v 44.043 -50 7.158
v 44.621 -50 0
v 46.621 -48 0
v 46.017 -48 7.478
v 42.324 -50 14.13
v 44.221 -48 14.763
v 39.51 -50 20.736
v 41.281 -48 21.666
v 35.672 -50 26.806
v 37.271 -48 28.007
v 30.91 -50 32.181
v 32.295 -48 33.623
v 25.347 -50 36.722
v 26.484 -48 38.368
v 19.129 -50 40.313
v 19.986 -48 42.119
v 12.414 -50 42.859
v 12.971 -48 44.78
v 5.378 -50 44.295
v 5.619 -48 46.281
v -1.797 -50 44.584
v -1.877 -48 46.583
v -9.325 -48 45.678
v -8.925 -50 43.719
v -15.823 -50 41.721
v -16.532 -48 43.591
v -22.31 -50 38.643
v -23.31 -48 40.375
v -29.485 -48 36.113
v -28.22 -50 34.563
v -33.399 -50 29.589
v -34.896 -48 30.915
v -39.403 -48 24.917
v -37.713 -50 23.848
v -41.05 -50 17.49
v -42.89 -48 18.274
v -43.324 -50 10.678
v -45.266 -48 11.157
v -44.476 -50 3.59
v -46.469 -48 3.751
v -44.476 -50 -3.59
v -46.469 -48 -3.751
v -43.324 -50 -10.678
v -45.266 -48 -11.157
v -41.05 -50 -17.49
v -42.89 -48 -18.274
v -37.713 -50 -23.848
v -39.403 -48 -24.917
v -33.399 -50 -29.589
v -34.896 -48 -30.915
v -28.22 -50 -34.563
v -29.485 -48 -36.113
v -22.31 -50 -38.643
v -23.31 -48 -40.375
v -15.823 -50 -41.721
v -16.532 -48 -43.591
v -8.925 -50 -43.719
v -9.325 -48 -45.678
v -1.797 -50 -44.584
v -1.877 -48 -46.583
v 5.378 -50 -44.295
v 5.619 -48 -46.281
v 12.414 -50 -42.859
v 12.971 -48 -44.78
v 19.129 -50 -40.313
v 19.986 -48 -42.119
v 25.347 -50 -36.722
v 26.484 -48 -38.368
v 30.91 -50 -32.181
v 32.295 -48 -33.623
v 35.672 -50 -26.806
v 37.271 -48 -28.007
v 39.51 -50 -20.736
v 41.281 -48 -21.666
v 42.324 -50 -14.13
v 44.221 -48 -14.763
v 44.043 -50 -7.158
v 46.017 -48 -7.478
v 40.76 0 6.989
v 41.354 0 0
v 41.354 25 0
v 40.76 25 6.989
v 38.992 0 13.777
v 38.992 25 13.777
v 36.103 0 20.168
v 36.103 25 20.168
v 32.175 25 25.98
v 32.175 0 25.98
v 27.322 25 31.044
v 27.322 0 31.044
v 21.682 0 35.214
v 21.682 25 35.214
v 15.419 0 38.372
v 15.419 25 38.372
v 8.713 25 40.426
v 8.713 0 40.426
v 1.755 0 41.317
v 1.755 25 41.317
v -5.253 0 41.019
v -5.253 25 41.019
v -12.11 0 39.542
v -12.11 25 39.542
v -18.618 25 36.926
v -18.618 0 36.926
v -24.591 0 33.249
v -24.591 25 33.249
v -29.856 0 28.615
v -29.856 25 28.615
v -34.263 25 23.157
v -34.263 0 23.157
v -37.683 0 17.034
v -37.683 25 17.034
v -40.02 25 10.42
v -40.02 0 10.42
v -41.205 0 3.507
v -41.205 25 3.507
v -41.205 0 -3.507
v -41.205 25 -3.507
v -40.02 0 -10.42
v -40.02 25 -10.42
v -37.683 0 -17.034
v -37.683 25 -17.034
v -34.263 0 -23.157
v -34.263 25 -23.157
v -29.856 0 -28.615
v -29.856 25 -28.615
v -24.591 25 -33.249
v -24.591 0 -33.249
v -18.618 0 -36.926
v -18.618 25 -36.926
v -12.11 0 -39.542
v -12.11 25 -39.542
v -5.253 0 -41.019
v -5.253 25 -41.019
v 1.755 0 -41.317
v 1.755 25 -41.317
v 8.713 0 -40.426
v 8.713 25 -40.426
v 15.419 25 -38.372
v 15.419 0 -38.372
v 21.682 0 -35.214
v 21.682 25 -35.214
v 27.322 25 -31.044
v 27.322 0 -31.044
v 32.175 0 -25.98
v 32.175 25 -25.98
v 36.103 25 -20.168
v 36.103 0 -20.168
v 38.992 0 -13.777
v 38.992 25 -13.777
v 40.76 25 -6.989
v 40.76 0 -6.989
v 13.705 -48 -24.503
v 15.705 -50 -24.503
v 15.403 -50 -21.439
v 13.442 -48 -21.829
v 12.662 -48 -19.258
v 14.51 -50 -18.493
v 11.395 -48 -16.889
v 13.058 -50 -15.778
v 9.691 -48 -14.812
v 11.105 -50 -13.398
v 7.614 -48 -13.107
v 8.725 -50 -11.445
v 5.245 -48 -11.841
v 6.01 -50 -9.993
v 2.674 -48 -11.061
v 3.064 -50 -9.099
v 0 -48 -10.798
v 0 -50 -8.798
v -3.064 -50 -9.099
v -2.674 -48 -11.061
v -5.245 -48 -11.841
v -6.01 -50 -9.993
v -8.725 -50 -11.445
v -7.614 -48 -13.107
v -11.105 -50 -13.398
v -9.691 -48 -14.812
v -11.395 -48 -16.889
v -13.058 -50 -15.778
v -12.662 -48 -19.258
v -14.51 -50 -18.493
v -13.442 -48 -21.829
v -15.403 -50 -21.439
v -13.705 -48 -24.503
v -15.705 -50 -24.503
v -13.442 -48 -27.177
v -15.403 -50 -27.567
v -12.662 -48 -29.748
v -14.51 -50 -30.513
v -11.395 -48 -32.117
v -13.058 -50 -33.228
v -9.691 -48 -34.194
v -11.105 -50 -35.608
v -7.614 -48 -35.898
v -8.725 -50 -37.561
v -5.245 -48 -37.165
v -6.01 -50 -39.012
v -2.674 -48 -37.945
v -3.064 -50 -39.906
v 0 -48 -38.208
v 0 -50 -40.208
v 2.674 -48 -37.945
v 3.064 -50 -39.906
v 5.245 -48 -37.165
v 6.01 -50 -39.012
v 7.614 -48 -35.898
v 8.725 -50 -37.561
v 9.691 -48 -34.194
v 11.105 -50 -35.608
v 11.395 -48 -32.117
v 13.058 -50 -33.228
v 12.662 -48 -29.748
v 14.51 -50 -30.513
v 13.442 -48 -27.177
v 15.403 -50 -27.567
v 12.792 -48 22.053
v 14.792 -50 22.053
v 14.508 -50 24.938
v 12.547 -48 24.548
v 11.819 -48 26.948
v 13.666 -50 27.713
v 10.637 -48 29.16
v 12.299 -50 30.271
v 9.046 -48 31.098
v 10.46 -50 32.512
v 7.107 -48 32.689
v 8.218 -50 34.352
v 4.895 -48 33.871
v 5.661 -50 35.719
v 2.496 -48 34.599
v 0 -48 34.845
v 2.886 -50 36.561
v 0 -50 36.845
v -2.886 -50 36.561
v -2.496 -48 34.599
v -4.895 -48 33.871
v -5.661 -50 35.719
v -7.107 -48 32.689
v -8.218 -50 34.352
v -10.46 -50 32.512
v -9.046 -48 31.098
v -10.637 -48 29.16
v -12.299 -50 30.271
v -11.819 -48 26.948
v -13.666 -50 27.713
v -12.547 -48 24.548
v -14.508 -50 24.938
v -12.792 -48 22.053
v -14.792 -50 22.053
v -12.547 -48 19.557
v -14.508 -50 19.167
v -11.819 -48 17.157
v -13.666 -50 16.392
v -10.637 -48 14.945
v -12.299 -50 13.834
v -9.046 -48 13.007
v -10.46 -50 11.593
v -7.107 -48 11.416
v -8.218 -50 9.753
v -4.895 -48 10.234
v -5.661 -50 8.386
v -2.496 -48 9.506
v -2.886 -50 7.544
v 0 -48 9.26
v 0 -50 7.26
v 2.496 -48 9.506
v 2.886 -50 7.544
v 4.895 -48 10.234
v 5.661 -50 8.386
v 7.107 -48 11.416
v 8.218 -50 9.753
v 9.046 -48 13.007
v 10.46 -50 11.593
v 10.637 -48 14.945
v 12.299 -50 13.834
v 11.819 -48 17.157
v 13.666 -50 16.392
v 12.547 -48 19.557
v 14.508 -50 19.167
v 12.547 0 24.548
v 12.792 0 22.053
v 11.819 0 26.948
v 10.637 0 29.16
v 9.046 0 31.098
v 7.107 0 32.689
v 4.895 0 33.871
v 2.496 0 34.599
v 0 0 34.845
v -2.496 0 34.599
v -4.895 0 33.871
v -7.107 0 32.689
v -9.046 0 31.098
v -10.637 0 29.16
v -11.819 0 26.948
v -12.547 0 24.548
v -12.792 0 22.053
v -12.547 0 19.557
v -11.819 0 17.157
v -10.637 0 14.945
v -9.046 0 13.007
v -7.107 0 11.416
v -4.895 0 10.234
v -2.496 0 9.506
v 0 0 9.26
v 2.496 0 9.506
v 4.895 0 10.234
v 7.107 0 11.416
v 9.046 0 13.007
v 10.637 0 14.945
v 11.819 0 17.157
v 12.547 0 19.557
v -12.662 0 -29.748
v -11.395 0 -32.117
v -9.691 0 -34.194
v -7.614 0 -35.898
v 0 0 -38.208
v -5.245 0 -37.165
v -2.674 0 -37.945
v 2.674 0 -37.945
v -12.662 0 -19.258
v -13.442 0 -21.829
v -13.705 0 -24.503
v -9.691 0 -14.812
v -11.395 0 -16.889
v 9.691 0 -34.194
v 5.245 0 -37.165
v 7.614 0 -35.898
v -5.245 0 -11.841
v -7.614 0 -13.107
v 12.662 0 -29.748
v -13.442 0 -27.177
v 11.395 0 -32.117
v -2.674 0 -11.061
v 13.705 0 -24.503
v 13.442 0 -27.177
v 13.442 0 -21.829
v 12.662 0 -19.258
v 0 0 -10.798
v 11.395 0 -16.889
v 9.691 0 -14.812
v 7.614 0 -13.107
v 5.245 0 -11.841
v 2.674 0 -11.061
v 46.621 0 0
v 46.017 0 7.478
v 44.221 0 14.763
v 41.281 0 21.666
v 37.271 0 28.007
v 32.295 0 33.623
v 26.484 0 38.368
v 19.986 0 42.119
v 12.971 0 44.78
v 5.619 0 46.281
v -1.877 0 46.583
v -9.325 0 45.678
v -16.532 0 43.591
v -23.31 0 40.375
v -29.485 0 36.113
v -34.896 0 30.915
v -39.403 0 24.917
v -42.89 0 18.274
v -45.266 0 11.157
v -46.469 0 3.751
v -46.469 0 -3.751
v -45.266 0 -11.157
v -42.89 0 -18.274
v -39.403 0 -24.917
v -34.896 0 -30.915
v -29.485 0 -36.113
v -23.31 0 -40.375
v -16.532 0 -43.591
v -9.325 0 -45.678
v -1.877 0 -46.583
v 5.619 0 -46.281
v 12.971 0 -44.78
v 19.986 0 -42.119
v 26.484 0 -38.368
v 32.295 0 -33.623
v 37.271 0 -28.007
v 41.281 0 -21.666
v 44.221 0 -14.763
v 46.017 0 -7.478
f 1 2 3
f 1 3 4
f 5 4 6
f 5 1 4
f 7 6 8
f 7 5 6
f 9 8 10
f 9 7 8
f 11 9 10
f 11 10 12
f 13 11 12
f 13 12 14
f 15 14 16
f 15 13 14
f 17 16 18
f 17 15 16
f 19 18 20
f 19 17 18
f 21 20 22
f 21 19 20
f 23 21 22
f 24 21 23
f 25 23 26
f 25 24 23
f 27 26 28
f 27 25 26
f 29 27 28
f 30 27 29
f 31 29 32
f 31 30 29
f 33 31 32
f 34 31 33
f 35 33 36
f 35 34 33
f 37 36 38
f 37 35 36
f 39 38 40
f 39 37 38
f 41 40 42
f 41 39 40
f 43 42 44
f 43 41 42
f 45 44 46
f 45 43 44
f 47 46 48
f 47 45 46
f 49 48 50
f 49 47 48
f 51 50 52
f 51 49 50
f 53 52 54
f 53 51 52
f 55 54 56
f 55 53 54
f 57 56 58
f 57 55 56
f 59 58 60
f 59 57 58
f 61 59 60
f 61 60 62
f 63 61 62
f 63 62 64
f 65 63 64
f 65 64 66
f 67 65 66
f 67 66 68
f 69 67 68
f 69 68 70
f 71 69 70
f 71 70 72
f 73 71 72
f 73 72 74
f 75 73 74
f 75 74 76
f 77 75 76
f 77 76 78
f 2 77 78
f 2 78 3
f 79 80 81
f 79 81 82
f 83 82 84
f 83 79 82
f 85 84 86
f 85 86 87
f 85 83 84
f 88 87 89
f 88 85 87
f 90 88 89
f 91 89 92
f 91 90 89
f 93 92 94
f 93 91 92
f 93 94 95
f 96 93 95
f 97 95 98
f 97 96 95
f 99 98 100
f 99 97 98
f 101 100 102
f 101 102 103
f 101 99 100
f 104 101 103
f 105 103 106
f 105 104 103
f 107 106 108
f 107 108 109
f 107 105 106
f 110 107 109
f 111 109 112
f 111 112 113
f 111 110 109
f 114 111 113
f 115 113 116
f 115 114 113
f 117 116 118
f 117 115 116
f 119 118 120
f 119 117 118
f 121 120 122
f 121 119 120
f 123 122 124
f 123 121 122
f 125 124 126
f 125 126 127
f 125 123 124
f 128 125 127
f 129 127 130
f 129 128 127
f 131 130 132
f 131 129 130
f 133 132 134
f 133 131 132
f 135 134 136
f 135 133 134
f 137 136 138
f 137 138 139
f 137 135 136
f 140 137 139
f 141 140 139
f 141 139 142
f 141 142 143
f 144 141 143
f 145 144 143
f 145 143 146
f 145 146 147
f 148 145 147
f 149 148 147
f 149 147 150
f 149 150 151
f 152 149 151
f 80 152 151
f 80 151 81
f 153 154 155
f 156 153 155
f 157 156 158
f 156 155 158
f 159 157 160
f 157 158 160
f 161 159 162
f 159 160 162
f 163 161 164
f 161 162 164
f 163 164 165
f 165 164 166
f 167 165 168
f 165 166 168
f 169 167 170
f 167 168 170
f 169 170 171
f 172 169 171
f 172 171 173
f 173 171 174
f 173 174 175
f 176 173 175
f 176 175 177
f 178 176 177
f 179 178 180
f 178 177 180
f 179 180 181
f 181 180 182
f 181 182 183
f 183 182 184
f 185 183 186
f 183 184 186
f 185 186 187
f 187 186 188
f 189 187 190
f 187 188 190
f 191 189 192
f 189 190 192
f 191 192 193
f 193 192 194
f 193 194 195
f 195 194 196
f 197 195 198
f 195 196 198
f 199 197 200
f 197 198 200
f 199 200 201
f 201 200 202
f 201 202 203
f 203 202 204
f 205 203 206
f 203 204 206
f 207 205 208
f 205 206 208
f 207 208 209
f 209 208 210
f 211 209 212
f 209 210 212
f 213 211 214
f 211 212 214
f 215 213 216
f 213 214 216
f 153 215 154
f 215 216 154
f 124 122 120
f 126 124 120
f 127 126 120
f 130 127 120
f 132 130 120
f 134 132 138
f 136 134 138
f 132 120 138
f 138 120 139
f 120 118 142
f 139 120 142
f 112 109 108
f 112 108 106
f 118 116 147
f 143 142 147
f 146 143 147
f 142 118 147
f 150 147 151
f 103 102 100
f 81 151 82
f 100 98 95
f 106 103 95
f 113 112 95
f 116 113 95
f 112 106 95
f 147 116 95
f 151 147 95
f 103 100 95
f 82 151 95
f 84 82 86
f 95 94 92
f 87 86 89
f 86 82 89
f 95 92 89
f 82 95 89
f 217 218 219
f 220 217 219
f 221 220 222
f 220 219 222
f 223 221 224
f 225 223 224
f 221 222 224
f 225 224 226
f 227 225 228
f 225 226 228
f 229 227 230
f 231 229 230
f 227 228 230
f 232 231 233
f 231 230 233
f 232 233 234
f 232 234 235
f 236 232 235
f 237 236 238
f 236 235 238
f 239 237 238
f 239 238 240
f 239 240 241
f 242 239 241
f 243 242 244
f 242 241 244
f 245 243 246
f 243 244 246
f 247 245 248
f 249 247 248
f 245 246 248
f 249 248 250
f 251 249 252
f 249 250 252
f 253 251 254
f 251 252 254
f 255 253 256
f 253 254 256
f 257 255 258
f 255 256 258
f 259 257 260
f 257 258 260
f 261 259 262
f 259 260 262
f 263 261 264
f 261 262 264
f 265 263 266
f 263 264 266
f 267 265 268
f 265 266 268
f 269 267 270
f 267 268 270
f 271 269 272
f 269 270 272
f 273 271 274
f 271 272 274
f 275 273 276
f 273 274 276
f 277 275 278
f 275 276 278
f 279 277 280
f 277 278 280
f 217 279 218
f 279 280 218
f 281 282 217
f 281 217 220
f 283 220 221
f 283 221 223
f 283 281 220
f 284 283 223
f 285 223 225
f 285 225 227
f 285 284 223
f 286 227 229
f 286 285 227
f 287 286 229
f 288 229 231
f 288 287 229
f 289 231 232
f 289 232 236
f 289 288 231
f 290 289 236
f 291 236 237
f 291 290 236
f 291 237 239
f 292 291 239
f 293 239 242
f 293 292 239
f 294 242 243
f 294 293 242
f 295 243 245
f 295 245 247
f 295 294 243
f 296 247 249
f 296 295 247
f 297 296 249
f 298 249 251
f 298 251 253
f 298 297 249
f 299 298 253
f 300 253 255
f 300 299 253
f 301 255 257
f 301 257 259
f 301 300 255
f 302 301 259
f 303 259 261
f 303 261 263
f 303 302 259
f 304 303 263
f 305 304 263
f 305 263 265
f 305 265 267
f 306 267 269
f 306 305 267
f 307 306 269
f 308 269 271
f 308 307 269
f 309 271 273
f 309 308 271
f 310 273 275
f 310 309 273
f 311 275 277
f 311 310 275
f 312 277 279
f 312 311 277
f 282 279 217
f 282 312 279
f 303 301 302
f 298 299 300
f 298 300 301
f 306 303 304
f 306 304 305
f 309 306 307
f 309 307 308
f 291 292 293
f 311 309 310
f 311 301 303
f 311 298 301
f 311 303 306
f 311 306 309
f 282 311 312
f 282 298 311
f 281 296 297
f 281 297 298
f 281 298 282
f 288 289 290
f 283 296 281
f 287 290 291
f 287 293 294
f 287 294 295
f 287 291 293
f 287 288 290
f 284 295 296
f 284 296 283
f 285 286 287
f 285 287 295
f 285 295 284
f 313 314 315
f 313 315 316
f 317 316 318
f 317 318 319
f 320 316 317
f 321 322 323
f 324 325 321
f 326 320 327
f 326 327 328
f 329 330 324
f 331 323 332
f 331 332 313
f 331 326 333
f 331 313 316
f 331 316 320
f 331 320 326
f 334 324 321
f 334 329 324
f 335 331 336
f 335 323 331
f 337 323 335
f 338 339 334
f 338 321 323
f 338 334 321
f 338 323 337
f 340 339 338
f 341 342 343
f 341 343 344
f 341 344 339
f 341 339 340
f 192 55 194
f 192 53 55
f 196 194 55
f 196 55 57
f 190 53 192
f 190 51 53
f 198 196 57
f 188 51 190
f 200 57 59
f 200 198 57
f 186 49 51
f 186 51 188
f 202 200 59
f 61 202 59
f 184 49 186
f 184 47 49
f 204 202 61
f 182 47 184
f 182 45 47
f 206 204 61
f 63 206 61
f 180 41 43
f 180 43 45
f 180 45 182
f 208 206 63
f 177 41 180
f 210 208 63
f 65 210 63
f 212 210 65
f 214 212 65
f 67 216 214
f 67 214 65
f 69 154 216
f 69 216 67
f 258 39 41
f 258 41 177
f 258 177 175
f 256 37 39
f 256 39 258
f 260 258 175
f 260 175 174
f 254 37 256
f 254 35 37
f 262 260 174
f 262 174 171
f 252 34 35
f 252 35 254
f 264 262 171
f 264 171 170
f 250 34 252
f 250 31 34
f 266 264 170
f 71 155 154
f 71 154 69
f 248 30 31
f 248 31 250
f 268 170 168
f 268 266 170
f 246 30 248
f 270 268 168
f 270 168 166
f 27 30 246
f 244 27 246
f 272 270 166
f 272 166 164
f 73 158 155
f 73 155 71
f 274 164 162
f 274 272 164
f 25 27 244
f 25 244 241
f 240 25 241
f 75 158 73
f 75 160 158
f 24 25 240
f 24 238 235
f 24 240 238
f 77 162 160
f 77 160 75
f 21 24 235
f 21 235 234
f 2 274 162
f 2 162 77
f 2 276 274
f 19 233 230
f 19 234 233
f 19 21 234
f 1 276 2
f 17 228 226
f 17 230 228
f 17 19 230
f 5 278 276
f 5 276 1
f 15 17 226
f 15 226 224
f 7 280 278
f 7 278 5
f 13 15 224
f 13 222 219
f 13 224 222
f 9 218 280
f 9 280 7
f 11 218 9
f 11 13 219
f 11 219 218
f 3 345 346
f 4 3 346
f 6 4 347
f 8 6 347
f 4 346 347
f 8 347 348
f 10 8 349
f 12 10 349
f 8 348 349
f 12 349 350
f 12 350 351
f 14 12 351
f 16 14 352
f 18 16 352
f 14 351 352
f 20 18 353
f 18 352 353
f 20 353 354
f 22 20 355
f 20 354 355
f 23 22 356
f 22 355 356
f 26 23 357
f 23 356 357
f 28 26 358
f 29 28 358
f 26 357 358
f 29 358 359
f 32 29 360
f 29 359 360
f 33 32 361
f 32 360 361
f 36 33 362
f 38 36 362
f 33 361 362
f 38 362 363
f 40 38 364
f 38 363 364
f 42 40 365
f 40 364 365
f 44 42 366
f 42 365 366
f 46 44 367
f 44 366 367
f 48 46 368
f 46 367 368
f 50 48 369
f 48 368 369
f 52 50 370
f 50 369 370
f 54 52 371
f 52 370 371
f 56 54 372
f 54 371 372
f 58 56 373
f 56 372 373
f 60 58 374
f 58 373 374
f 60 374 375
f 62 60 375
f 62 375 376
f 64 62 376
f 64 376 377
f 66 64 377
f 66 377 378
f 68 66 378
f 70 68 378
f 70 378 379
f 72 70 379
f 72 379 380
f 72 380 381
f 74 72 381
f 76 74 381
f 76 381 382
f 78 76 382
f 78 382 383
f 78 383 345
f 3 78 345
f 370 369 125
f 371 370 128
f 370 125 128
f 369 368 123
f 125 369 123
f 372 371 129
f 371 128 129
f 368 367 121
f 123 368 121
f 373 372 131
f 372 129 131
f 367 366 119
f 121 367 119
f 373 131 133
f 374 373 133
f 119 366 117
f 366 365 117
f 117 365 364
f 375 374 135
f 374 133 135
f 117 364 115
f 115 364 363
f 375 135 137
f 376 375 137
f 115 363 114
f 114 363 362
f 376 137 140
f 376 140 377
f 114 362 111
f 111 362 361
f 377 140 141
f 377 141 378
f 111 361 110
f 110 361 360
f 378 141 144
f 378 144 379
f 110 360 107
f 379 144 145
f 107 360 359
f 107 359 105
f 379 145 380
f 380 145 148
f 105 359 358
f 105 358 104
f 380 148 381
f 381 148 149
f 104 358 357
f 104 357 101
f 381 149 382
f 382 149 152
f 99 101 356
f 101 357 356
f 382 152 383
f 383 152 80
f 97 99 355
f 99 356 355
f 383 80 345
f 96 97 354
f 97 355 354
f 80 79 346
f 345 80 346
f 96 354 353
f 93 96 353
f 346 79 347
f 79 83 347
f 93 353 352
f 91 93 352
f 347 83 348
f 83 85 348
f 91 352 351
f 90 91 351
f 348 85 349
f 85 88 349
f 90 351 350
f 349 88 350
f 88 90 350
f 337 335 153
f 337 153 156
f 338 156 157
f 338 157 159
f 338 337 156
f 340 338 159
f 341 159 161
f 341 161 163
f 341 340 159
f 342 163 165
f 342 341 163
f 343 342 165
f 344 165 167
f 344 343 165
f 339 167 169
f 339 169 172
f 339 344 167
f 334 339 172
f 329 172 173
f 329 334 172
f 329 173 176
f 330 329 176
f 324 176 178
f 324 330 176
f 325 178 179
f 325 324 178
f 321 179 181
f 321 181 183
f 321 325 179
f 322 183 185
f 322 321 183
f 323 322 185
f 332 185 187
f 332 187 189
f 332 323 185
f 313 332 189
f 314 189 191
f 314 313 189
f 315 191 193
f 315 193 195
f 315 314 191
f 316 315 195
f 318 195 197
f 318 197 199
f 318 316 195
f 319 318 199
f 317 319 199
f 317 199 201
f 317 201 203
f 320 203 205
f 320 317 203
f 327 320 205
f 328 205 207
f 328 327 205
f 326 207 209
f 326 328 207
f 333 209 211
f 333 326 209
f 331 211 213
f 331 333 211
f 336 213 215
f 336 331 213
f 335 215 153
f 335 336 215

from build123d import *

# Parameters (mm, degrees)
F0_R     = 46.620662
F0_R_2   = 13.705086
F0_R_3   = 12.792455
F1_DEPTH = 50
F2_SIZE  = 2
F3_R     = 41.354393
F4_DEPTH = 25


with BuildPart() as f1:
    # F0 (on Front) → F1 (new body)
    with BuildSketch(Plane.XZ):
        Circle(F0_R)
        with Locations((0, -24.502814)):
            Circle(F0_R_2, mode=Mode.SUBTRACT)
        with Locations((0, 22.052526)):
            Circle(F0_R_3, mode=Mode.SUBTRACT)
    extrude(amount=F1_DEPTH)

    # F2
    f2_edges = [f1.edges().sort_by_distance(p)[0] for p in [
        (-46.620662, -50, 0),
        (-13.705086, -50, -24.502814),
        (-12.792455, -50, 22.052526),
    ]]
    chamfer(f2_edges, length=F2_SIZE)

    # F3 (on Front) → F4 (join)
    with BuildSketch(Plane.XZ):
        Circle(F3_R)
    extrude(amount=-F4_DEPTH)


solid = f1.part
